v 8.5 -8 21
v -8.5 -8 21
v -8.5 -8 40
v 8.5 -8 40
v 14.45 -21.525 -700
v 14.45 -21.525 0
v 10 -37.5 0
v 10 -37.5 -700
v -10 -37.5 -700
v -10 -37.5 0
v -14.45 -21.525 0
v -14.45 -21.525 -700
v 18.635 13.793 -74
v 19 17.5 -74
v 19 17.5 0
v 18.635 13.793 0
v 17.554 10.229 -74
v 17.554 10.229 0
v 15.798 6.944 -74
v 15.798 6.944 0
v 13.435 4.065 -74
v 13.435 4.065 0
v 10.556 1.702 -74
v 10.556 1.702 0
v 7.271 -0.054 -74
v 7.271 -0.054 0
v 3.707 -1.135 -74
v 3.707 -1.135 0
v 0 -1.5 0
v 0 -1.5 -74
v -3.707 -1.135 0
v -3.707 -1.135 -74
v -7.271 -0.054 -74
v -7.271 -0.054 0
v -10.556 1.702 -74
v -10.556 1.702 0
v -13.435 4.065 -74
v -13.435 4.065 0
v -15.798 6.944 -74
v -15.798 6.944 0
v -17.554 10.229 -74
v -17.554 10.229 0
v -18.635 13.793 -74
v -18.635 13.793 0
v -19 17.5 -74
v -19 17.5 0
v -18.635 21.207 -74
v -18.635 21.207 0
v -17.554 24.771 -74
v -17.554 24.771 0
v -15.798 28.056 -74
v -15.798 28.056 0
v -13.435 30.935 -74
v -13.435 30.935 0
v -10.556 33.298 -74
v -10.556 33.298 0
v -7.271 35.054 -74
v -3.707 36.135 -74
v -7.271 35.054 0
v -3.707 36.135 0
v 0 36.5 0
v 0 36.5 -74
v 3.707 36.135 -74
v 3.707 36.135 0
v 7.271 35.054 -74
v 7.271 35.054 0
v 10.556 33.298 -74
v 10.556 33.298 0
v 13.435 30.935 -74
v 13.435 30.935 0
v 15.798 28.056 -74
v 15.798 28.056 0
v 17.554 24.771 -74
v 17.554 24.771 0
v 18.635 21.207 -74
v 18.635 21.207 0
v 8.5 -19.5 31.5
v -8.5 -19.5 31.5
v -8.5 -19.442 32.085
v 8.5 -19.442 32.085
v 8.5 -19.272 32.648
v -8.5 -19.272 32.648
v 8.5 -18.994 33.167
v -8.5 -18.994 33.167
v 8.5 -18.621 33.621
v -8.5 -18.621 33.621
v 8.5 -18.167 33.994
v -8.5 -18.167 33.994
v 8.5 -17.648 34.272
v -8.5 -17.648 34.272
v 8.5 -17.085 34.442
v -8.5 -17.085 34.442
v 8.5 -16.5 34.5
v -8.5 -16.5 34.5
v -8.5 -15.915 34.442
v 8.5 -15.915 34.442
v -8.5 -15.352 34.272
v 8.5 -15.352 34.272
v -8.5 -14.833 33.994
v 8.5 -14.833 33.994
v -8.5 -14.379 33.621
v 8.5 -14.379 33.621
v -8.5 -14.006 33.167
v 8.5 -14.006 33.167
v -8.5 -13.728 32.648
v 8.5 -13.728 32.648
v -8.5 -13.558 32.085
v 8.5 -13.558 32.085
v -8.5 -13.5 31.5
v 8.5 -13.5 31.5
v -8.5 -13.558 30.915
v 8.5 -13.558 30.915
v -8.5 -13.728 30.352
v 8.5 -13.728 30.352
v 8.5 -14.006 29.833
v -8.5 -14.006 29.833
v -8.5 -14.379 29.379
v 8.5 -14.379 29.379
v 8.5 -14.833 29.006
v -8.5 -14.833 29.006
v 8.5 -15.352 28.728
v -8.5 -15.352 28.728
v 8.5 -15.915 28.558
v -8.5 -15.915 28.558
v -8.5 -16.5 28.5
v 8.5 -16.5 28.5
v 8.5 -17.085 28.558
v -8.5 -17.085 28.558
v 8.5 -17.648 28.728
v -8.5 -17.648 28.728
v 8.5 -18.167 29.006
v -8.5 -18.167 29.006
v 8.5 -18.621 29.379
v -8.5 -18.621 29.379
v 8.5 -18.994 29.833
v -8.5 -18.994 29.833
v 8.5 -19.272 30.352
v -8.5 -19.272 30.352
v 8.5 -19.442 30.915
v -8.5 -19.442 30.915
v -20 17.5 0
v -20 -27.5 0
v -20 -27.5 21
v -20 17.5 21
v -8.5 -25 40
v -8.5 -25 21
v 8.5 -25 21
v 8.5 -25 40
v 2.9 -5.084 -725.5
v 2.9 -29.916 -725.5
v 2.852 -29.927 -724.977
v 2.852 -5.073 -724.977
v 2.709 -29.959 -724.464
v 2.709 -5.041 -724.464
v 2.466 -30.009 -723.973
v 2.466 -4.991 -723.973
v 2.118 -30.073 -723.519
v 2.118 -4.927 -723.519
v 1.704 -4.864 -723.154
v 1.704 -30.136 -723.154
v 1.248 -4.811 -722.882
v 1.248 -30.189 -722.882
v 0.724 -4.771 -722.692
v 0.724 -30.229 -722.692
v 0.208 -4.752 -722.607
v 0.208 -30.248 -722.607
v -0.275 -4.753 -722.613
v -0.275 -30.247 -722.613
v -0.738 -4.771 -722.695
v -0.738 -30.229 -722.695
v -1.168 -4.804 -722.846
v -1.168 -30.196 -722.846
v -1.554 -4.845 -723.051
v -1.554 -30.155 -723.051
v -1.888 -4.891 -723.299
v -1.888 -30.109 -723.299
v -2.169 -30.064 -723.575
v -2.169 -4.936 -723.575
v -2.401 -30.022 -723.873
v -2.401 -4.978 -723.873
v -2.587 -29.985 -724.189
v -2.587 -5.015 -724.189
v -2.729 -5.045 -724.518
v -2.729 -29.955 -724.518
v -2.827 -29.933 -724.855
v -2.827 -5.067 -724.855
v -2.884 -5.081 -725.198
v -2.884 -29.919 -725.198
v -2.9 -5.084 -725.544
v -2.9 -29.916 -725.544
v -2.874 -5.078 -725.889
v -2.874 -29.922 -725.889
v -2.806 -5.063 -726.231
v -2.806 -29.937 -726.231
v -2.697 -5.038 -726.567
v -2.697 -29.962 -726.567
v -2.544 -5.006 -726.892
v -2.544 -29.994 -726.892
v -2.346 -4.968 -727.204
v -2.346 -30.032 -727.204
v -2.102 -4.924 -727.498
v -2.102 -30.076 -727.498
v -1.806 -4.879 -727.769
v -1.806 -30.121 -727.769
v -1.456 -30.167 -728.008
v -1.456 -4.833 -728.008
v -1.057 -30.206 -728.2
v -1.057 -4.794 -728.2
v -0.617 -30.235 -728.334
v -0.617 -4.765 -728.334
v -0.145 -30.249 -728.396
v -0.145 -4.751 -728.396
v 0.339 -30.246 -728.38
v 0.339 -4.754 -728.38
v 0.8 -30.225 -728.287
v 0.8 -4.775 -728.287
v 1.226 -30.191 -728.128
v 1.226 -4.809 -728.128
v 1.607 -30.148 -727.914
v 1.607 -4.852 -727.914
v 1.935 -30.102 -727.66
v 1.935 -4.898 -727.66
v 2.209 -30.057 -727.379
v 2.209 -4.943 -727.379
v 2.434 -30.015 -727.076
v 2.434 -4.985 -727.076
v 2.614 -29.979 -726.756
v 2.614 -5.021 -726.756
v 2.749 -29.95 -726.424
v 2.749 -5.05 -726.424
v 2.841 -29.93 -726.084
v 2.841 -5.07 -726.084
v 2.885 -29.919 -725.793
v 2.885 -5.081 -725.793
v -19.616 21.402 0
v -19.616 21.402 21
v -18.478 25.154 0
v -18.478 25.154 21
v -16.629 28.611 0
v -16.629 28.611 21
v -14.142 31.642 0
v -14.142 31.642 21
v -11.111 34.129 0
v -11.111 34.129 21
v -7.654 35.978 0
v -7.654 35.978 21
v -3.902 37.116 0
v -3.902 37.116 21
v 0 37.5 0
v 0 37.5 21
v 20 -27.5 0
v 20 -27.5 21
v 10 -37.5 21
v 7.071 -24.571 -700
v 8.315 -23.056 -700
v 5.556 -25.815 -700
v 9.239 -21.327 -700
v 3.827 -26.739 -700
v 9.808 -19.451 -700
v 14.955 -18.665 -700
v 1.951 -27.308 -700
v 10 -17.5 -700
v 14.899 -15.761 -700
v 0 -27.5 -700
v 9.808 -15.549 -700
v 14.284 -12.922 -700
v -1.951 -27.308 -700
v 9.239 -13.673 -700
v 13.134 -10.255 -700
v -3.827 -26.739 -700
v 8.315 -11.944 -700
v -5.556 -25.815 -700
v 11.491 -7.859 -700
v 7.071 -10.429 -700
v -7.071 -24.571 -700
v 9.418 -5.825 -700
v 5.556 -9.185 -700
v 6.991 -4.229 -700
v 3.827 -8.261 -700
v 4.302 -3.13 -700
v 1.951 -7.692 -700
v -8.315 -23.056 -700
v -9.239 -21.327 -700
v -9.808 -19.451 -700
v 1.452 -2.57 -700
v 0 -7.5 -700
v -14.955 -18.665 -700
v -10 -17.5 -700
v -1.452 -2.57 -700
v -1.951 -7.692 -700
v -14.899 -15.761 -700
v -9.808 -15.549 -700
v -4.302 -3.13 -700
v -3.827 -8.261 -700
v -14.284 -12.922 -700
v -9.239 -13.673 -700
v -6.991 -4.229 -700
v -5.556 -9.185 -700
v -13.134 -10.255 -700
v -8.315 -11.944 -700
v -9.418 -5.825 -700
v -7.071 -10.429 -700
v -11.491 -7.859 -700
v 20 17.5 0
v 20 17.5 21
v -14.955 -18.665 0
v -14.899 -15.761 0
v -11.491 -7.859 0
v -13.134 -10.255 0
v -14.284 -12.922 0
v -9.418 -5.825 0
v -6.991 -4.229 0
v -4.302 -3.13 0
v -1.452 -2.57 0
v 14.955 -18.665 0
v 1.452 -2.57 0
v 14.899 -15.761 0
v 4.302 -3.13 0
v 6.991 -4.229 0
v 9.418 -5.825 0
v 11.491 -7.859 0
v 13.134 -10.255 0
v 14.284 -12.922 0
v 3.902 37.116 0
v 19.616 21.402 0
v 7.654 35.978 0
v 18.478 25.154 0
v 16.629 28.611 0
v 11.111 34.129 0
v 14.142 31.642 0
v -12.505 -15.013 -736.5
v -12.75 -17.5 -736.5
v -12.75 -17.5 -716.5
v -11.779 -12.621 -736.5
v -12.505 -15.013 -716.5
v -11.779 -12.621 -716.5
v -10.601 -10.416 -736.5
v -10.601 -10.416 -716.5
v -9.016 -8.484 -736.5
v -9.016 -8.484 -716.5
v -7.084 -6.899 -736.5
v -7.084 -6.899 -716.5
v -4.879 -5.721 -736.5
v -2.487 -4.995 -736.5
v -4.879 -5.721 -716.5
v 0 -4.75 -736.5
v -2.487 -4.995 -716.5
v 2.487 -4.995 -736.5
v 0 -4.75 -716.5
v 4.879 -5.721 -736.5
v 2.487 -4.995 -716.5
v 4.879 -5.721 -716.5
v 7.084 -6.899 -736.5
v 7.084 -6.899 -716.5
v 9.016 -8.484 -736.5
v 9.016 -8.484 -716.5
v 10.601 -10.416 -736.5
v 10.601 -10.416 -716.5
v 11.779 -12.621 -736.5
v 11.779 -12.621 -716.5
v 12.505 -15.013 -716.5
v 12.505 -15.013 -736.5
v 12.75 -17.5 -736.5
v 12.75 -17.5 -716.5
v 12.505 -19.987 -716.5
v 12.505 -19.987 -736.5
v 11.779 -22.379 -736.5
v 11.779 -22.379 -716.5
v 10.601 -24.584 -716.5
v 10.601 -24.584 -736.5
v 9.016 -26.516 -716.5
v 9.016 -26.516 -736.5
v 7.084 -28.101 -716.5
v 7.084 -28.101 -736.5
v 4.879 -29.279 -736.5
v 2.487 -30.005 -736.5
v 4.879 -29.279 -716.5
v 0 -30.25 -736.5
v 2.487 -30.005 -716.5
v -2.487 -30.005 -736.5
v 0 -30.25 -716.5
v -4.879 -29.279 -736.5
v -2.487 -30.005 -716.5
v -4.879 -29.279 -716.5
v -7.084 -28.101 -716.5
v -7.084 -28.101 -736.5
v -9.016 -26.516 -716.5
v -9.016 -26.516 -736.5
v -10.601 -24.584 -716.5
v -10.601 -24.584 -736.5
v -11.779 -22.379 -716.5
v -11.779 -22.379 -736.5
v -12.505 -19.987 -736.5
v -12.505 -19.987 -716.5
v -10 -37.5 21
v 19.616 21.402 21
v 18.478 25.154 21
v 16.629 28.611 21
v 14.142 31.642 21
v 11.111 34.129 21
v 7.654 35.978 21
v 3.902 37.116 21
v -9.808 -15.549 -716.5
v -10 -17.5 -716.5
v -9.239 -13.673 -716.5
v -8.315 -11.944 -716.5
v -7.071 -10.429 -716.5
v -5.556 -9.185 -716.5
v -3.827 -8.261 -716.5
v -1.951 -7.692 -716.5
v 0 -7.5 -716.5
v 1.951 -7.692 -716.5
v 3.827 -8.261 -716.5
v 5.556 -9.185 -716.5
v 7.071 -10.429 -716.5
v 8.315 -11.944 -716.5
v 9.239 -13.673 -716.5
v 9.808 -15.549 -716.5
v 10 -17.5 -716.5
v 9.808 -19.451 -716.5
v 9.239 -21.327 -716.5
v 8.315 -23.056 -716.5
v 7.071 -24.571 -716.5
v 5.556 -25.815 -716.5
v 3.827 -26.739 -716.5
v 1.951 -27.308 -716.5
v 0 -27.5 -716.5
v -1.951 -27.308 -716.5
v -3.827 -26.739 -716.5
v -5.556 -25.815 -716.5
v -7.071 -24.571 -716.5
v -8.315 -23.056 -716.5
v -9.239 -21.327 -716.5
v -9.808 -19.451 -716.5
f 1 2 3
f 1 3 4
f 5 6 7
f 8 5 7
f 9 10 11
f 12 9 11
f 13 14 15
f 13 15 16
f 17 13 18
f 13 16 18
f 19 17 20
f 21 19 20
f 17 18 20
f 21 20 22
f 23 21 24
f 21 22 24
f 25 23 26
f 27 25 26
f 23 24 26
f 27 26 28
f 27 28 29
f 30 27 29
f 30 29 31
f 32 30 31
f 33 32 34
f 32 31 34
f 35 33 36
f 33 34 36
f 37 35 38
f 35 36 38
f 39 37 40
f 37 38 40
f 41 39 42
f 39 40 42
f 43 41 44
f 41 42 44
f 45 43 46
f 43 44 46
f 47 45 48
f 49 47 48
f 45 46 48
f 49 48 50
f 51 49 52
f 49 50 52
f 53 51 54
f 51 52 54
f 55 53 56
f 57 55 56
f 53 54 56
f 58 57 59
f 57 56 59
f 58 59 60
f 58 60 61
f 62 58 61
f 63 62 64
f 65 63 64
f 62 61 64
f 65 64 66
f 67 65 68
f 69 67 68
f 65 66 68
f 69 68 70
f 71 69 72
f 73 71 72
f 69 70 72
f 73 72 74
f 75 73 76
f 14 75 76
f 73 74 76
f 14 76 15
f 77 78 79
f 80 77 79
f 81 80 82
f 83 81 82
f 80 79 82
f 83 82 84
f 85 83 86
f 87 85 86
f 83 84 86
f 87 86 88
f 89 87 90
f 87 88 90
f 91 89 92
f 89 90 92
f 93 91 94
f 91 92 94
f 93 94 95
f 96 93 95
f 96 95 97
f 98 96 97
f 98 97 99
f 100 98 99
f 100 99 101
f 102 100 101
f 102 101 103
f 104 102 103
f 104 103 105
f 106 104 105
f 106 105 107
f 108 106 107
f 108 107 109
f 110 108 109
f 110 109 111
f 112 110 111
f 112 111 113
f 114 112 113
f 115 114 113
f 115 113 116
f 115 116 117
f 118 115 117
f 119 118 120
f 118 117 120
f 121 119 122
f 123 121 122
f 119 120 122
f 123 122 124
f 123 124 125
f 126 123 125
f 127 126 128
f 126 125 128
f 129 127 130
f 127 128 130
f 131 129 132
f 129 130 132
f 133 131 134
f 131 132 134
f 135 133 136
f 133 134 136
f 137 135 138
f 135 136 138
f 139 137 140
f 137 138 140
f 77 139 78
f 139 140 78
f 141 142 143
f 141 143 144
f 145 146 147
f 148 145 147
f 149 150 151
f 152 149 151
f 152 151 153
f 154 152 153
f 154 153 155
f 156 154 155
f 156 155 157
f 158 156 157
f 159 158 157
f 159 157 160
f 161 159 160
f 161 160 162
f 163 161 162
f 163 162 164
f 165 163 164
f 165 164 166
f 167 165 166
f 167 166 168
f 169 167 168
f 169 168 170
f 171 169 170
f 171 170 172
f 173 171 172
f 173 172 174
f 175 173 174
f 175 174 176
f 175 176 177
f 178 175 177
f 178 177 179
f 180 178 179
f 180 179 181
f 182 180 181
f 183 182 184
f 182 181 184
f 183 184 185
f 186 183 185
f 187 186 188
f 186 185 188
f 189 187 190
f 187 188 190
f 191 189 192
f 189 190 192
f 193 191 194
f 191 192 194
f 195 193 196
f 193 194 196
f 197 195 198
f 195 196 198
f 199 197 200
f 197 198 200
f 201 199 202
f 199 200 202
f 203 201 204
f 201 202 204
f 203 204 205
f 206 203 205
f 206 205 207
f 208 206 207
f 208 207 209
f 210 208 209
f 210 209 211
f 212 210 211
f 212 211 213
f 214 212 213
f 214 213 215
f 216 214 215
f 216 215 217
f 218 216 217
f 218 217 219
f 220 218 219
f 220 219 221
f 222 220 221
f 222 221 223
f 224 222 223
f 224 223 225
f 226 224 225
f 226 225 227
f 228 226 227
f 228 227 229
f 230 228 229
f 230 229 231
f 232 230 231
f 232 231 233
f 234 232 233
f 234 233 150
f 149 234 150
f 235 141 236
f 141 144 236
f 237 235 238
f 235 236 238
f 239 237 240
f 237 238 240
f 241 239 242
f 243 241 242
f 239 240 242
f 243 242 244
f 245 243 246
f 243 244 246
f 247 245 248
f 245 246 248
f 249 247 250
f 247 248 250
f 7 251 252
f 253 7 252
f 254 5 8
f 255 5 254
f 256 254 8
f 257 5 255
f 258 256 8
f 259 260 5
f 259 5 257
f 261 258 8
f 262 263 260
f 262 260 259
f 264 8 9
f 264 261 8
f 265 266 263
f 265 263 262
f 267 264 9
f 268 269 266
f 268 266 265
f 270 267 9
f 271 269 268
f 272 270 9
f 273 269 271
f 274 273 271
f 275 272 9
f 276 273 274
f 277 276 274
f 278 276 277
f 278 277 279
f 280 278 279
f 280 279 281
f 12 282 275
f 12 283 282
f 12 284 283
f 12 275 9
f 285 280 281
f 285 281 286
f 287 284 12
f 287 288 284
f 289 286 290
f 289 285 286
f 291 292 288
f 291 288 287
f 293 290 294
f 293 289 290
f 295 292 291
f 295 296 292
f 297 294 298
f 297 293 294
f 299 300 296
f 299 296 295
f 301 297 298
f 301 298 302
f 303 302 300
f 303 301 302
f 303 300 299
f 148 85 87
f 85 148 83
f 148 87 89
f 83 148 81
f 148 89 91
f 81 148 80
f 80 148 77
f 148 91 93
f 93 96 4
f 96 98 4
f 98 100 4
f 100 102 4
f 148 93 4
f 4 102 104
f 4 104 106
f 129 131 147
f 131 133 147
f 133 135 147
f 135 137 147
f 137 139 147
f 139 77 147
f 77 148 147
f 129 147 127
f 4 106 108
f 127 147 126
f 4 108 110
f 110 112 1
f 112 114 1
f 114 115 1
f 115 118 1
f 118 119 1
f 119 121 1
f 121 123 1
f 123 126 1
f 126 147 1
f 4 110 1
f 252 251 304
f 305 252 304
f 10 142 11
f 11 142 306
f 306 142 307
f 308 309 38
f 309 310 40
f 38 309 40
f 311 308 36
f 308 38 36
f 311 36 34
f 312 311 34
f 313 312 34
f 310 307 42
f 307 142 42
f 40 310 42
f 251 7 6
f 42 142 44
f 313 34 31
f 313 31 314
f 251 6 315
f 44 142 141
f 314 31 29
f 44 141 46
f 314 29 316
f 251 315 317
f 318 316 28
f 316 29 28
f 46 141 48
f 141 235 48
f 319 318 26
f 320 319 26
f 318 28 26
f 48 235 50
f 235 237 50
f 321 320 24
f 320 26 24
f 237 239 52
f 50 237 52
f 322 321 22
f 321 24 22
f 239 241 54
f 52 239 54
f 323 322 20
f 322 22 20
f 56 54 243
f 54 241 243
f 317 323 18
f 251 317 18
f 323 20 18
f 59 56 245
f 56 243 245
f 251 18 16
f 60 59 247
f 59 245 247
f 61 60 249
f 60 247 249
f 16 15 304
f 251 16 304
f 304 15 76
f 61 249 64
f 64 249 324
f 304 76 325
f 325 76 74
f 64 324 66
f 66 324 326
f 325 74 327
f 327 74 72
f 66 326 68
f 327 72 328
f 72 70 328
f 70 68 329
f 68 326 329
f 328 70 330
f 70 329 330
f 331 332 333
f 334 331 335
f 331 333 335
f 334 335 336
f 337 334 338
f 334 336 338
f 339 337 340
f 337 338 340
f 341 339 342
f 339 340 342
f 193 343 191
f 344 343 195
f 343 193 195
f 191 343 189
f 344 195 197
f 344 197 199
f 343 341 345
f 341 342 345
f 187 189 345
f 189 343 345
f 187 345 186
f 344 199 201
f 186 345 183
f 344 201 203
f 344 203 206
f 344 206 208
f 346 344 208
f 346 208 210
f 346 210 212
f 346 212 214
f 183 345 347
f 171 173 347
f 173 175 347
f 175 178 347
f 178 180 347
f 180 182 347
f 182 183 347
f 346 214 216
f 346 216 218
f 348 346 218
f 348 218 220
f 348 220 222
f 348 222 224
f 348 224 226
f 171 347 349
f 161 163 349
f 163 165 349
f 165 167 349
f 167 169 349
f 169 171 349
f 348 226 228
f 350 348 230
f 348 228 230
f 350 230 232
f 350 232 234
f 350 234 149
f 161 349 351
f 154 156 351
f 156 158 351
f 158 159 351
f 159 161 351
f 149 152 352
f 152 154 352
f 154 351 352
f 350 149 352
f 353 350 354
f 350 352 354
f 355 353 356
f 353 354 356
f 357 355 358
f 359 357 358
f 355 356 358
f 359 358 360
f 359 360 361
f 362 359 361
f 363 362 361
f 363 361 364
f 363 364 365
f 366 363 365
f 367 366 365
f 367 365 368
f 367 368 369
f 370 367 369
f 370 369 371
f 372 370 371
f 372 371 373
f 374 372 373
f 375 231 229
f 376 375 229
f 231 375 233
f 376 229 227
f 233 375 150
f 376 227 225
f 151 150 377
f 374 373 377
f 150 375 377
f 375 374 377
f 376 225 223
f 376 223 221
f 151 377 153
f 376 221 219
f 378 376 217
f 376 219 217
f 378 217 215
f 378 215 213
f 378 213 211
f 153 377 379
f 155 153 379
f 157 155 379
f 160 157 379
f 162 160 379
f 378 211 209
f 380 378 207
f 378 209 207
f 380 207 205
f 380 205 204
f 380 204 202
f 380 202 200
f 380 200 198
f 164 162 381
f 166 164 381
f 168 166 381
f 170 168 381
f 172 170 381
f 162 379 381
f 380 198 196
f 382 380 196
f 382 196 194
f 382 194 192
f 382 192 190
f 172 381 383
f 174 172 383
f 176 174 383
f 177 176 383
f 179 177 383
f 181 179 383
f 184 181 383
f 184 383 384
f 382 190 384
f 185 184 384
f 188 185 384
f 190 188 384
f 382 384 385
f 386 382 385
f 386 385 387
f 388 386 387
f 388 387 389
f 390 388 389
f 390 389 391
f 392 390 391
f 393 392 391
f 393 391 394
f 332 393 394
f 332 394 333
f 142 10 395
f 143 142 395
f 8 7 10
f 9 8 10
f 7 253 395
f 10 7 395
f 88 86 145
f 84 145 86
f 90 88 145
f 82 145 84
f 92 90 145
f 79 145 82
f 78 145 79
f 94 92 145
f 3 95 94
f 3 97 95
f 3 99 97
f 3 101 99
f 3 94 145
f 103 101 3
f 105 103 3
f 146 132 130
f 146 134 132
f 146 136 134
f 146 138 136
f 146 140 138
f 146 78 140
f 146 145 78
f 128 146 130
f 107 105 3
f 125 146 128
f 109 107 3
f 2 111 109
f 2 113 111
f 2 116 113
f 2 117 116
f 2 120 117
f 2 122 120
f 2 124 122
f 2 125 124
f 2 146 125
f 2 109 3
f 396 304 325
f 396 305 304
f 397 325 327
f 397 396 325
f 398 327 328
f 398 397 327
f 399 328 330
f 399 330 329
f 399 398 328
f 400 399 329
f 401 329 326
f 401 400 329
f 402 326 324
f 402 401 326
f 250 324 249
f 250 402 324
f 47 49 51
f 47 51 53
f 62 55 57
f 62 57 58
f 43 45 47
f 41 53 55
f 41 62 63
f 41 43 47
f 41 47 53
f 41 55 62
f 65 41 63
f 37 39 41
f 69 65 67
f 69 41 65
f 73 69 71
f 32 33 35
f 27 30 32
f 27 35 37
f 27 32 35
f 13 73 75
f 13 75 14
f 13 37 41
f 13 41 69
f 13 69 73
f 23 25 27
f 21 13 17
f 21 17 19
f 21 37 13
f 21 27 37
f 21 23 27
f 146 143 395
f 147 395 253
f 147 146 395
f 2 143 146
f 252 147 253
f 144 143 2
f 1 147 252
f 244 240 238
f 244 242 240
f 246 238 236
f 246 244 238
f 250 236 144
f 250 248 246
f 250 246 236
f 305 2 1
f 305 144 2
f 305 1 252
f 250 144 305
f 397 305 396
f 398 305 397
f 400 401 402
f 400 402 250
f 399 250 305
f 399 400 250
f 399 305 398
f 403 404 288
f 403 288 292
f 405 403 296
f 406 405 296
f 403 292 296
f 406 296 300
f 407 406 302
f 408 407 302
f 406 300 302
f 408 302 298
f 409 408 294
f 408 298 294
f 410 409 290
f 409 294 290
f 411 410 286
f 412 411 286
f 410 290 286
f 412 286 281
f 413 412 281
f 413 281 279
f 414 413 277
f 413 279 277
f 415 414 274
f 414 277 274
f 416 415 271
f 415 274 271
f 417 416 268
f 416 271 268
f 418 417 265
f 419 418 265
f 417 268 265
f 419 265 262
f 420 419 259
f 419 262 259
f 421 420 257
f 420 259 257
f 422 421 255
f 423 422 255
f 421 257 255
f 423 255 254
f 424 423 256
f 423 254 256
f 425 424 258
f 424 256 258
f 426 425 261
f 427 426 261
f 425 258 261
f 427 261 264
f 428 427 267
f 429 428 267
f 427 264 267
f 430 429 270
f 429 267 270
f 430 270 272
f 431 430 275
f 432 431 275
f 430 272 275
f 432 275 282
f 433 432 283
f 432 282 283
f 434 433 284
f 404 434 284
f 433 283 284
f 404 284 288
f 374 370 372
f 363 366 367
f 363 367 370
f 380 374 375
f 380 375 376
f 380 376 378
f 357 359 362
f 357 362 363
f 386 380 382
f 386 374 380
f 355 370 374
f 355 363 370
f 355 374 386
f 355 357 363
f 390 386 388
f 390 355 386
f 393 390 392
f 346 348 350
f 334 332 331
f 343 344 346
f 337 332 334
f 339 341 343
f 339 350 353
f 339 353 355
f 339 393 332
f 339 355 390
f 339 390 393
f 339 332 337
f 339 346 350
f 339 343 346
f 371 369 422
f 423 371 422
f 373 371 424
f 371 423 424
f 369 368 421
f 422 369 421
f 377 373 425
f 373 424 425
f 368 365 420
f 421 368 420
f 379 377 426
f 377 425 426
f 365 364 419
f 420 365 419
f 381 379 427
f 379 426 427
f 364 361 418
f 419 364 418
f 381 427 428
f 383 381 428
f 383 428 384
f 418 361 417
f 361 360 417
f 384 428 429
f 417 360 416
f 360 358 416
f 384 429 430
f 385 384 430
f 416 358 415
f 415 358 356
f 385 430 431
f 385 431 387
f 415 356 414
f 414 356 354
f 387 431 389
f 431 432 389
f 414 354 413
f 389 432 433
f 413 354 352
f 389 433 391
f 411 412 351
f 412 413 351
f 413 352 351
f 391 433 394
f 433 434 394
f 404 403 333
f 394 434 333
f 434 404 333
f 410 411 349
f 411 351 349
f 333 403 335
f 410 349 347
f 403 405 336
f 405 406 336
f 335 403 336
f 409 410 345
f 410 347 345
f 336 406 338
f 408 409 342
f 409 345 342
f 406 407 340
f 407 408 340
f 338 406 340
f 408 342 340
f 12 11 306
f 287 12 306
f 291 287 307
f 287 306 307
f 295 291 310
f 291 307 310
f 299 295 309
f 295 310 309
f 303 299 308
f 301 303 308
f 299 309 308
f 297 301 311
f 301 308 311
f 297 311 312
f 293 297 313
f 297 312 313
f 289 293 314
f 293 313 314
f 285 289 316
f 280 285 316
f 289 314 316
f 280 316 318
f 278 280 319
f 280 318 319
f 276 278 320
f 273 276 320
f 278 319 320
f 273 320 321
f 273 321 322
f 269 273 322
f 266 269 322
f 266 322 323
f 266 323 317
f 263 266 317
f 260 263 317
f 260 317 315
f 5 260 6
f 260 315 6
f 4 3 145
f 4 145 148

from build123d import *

# Parameters (mm, degrees)
SKETCH_1_W          = 40
SKETCH_1_H          = 75
EXTRUDE_1_DEPTH     = 21
FILLET_1_R          = 20
CHAMFER_1_SIZE      = 10
EXTRUDE_2_DEPTH     = 700
SKETCH_3_R          = 19
EXTRUDE_4_DEPTH     = 74
SKETCH_4_W          = 17
SKETCH_4_H          = 17
EXTRUDE_5_DEPTH     = 19
SKETCH_5_R          = 3
CUT_EXTRUDE_1_DEPTH = 19
SKETCH_6_R          = 10
EXTRUDE_6_DEPTH     = 16.5
SKETCH_7_R          = 12.75
EXTRUDE_7_DEPTH     = 20
SKETCH_9_R          = 2.9
CUT_EXTRUDE_2_DEPTH = 741.578996462


with BuildPart() as part:
    # 草图1 → 凸台-拉伸1 (new body)
    with BuildSketch(Plane.XY):
        Rectangle(SKETCH_1_W, SKETCH_1_H)
    extrude(amount=EXTRUDE_1_DEPTH)

    # 圆角1
    fillet_1_edges = [part.edges().sort_by_distance(p)[0] for p in [
        (-20, 37.5, 10.5),
        (20, 37.5, 10.5),
    ]]
    fillet(fillet_1_edges, radius=FILLET_1_R - 0.0001)  # a hair under: the kernel refuses the full size

    # 倒角1
    chamfer_1_edges = [part.edges().sort_by_distance(p)[0] for p in [
        (20, -37.5, 10.5),
        (-20, -37.5, 10.5),
    ]]
    chamfer(chamfer_1_edges, length=CHAMFER_1_SIZE)

    # 草图2 → 凸台-拉伸2 (add)
    with BuildSketch(Plane(origin=(0, 0, 0), x_dir=(-1, 0, 0), z_dir=(0, 0, -1))):
        with BuildLine():
            Line((-10, -37.5), (10, -37.5))
            Line((10, -37.5), (14.449874371, -21.525062814))
            ThreePointArc((14.449874371, -21.525062814), (0, -2.5), (-14.449874371, -21.525062814))
            Line((-14.449874371, -21.525062814), (-10, -37.5))
        make_face()
    extrude(amount=EXTRUDE_2_DEPTH)

    # 草图3 → 凸台-拉伸4 (add)
    with BuildSketch(Plane(origin=(0, 0, 0), x_dir=(-1, 0, 0), z_dir=(0, 0, -1))):
        with Locations(Location((0, 17.5, 0), (0, 0, 180))):
            Circle(SKETCH_3_R)
    extrude(amount=EXTRUDE_4_DEPTH)

    # 草图4 → 凸台-拉伸5 (add)
    with BuildSketch(Plane.XY.offset(21)):
        with Locations((0, -16.5)):
            Rectangle(SKETCH_4_W, SKETCH_4_H)
    extrude(amount=EXTRUDE_5_DEPTH)

    # 草图5 → 切除-拉伸1 (cut)
    with BuildSketch(Plane.ZY.offset(8.5)):
        with Locations(Location((31.5, -16.5, 0), (0, 0, 270))):
            Circle(SKETCH_5_R)
    extrude(amount=-CUT_EXTRUDE_1_DEPTH, mode=Mode.SUBTRACT)

    # 草图6 → 凸台-拉伸6 (add)
    with BuildSketch(Plane(origin=(0, 0, -700), x_dir=(-1, 0, 0), z_dir=(0, 0, -1))):
        with Locations((0, -17.5)):
            Circle(SKETCH_6_R)
    extrude(amount=EXTRUDE_6_DEPTH)

    # 草图7 → 凸台-拉伸7 (add)
    with BuildSketch(Plane(origin=(0, 0, -716.5), x_dir=(-1, 0, 0), z_dir=(0, 0, -1))):
        with Locations((0, -17.5)):
            Circle(SKETCH_7_R)
    extrude(amount=EXTRUDE_7_DEPTH)

    # 草图9 → 切除-拉伸2 (cut, through all)
    with BuildSketch(Plane.XZ.offset(37.5)):
        with Locations((0, -725.5)):
            Circle(SKETCH_9_R)
    extrude(amount=-CUT_EXTRUDE_2_DEPTH, mode=Mode.SUBTRACT)


solid = part.part
